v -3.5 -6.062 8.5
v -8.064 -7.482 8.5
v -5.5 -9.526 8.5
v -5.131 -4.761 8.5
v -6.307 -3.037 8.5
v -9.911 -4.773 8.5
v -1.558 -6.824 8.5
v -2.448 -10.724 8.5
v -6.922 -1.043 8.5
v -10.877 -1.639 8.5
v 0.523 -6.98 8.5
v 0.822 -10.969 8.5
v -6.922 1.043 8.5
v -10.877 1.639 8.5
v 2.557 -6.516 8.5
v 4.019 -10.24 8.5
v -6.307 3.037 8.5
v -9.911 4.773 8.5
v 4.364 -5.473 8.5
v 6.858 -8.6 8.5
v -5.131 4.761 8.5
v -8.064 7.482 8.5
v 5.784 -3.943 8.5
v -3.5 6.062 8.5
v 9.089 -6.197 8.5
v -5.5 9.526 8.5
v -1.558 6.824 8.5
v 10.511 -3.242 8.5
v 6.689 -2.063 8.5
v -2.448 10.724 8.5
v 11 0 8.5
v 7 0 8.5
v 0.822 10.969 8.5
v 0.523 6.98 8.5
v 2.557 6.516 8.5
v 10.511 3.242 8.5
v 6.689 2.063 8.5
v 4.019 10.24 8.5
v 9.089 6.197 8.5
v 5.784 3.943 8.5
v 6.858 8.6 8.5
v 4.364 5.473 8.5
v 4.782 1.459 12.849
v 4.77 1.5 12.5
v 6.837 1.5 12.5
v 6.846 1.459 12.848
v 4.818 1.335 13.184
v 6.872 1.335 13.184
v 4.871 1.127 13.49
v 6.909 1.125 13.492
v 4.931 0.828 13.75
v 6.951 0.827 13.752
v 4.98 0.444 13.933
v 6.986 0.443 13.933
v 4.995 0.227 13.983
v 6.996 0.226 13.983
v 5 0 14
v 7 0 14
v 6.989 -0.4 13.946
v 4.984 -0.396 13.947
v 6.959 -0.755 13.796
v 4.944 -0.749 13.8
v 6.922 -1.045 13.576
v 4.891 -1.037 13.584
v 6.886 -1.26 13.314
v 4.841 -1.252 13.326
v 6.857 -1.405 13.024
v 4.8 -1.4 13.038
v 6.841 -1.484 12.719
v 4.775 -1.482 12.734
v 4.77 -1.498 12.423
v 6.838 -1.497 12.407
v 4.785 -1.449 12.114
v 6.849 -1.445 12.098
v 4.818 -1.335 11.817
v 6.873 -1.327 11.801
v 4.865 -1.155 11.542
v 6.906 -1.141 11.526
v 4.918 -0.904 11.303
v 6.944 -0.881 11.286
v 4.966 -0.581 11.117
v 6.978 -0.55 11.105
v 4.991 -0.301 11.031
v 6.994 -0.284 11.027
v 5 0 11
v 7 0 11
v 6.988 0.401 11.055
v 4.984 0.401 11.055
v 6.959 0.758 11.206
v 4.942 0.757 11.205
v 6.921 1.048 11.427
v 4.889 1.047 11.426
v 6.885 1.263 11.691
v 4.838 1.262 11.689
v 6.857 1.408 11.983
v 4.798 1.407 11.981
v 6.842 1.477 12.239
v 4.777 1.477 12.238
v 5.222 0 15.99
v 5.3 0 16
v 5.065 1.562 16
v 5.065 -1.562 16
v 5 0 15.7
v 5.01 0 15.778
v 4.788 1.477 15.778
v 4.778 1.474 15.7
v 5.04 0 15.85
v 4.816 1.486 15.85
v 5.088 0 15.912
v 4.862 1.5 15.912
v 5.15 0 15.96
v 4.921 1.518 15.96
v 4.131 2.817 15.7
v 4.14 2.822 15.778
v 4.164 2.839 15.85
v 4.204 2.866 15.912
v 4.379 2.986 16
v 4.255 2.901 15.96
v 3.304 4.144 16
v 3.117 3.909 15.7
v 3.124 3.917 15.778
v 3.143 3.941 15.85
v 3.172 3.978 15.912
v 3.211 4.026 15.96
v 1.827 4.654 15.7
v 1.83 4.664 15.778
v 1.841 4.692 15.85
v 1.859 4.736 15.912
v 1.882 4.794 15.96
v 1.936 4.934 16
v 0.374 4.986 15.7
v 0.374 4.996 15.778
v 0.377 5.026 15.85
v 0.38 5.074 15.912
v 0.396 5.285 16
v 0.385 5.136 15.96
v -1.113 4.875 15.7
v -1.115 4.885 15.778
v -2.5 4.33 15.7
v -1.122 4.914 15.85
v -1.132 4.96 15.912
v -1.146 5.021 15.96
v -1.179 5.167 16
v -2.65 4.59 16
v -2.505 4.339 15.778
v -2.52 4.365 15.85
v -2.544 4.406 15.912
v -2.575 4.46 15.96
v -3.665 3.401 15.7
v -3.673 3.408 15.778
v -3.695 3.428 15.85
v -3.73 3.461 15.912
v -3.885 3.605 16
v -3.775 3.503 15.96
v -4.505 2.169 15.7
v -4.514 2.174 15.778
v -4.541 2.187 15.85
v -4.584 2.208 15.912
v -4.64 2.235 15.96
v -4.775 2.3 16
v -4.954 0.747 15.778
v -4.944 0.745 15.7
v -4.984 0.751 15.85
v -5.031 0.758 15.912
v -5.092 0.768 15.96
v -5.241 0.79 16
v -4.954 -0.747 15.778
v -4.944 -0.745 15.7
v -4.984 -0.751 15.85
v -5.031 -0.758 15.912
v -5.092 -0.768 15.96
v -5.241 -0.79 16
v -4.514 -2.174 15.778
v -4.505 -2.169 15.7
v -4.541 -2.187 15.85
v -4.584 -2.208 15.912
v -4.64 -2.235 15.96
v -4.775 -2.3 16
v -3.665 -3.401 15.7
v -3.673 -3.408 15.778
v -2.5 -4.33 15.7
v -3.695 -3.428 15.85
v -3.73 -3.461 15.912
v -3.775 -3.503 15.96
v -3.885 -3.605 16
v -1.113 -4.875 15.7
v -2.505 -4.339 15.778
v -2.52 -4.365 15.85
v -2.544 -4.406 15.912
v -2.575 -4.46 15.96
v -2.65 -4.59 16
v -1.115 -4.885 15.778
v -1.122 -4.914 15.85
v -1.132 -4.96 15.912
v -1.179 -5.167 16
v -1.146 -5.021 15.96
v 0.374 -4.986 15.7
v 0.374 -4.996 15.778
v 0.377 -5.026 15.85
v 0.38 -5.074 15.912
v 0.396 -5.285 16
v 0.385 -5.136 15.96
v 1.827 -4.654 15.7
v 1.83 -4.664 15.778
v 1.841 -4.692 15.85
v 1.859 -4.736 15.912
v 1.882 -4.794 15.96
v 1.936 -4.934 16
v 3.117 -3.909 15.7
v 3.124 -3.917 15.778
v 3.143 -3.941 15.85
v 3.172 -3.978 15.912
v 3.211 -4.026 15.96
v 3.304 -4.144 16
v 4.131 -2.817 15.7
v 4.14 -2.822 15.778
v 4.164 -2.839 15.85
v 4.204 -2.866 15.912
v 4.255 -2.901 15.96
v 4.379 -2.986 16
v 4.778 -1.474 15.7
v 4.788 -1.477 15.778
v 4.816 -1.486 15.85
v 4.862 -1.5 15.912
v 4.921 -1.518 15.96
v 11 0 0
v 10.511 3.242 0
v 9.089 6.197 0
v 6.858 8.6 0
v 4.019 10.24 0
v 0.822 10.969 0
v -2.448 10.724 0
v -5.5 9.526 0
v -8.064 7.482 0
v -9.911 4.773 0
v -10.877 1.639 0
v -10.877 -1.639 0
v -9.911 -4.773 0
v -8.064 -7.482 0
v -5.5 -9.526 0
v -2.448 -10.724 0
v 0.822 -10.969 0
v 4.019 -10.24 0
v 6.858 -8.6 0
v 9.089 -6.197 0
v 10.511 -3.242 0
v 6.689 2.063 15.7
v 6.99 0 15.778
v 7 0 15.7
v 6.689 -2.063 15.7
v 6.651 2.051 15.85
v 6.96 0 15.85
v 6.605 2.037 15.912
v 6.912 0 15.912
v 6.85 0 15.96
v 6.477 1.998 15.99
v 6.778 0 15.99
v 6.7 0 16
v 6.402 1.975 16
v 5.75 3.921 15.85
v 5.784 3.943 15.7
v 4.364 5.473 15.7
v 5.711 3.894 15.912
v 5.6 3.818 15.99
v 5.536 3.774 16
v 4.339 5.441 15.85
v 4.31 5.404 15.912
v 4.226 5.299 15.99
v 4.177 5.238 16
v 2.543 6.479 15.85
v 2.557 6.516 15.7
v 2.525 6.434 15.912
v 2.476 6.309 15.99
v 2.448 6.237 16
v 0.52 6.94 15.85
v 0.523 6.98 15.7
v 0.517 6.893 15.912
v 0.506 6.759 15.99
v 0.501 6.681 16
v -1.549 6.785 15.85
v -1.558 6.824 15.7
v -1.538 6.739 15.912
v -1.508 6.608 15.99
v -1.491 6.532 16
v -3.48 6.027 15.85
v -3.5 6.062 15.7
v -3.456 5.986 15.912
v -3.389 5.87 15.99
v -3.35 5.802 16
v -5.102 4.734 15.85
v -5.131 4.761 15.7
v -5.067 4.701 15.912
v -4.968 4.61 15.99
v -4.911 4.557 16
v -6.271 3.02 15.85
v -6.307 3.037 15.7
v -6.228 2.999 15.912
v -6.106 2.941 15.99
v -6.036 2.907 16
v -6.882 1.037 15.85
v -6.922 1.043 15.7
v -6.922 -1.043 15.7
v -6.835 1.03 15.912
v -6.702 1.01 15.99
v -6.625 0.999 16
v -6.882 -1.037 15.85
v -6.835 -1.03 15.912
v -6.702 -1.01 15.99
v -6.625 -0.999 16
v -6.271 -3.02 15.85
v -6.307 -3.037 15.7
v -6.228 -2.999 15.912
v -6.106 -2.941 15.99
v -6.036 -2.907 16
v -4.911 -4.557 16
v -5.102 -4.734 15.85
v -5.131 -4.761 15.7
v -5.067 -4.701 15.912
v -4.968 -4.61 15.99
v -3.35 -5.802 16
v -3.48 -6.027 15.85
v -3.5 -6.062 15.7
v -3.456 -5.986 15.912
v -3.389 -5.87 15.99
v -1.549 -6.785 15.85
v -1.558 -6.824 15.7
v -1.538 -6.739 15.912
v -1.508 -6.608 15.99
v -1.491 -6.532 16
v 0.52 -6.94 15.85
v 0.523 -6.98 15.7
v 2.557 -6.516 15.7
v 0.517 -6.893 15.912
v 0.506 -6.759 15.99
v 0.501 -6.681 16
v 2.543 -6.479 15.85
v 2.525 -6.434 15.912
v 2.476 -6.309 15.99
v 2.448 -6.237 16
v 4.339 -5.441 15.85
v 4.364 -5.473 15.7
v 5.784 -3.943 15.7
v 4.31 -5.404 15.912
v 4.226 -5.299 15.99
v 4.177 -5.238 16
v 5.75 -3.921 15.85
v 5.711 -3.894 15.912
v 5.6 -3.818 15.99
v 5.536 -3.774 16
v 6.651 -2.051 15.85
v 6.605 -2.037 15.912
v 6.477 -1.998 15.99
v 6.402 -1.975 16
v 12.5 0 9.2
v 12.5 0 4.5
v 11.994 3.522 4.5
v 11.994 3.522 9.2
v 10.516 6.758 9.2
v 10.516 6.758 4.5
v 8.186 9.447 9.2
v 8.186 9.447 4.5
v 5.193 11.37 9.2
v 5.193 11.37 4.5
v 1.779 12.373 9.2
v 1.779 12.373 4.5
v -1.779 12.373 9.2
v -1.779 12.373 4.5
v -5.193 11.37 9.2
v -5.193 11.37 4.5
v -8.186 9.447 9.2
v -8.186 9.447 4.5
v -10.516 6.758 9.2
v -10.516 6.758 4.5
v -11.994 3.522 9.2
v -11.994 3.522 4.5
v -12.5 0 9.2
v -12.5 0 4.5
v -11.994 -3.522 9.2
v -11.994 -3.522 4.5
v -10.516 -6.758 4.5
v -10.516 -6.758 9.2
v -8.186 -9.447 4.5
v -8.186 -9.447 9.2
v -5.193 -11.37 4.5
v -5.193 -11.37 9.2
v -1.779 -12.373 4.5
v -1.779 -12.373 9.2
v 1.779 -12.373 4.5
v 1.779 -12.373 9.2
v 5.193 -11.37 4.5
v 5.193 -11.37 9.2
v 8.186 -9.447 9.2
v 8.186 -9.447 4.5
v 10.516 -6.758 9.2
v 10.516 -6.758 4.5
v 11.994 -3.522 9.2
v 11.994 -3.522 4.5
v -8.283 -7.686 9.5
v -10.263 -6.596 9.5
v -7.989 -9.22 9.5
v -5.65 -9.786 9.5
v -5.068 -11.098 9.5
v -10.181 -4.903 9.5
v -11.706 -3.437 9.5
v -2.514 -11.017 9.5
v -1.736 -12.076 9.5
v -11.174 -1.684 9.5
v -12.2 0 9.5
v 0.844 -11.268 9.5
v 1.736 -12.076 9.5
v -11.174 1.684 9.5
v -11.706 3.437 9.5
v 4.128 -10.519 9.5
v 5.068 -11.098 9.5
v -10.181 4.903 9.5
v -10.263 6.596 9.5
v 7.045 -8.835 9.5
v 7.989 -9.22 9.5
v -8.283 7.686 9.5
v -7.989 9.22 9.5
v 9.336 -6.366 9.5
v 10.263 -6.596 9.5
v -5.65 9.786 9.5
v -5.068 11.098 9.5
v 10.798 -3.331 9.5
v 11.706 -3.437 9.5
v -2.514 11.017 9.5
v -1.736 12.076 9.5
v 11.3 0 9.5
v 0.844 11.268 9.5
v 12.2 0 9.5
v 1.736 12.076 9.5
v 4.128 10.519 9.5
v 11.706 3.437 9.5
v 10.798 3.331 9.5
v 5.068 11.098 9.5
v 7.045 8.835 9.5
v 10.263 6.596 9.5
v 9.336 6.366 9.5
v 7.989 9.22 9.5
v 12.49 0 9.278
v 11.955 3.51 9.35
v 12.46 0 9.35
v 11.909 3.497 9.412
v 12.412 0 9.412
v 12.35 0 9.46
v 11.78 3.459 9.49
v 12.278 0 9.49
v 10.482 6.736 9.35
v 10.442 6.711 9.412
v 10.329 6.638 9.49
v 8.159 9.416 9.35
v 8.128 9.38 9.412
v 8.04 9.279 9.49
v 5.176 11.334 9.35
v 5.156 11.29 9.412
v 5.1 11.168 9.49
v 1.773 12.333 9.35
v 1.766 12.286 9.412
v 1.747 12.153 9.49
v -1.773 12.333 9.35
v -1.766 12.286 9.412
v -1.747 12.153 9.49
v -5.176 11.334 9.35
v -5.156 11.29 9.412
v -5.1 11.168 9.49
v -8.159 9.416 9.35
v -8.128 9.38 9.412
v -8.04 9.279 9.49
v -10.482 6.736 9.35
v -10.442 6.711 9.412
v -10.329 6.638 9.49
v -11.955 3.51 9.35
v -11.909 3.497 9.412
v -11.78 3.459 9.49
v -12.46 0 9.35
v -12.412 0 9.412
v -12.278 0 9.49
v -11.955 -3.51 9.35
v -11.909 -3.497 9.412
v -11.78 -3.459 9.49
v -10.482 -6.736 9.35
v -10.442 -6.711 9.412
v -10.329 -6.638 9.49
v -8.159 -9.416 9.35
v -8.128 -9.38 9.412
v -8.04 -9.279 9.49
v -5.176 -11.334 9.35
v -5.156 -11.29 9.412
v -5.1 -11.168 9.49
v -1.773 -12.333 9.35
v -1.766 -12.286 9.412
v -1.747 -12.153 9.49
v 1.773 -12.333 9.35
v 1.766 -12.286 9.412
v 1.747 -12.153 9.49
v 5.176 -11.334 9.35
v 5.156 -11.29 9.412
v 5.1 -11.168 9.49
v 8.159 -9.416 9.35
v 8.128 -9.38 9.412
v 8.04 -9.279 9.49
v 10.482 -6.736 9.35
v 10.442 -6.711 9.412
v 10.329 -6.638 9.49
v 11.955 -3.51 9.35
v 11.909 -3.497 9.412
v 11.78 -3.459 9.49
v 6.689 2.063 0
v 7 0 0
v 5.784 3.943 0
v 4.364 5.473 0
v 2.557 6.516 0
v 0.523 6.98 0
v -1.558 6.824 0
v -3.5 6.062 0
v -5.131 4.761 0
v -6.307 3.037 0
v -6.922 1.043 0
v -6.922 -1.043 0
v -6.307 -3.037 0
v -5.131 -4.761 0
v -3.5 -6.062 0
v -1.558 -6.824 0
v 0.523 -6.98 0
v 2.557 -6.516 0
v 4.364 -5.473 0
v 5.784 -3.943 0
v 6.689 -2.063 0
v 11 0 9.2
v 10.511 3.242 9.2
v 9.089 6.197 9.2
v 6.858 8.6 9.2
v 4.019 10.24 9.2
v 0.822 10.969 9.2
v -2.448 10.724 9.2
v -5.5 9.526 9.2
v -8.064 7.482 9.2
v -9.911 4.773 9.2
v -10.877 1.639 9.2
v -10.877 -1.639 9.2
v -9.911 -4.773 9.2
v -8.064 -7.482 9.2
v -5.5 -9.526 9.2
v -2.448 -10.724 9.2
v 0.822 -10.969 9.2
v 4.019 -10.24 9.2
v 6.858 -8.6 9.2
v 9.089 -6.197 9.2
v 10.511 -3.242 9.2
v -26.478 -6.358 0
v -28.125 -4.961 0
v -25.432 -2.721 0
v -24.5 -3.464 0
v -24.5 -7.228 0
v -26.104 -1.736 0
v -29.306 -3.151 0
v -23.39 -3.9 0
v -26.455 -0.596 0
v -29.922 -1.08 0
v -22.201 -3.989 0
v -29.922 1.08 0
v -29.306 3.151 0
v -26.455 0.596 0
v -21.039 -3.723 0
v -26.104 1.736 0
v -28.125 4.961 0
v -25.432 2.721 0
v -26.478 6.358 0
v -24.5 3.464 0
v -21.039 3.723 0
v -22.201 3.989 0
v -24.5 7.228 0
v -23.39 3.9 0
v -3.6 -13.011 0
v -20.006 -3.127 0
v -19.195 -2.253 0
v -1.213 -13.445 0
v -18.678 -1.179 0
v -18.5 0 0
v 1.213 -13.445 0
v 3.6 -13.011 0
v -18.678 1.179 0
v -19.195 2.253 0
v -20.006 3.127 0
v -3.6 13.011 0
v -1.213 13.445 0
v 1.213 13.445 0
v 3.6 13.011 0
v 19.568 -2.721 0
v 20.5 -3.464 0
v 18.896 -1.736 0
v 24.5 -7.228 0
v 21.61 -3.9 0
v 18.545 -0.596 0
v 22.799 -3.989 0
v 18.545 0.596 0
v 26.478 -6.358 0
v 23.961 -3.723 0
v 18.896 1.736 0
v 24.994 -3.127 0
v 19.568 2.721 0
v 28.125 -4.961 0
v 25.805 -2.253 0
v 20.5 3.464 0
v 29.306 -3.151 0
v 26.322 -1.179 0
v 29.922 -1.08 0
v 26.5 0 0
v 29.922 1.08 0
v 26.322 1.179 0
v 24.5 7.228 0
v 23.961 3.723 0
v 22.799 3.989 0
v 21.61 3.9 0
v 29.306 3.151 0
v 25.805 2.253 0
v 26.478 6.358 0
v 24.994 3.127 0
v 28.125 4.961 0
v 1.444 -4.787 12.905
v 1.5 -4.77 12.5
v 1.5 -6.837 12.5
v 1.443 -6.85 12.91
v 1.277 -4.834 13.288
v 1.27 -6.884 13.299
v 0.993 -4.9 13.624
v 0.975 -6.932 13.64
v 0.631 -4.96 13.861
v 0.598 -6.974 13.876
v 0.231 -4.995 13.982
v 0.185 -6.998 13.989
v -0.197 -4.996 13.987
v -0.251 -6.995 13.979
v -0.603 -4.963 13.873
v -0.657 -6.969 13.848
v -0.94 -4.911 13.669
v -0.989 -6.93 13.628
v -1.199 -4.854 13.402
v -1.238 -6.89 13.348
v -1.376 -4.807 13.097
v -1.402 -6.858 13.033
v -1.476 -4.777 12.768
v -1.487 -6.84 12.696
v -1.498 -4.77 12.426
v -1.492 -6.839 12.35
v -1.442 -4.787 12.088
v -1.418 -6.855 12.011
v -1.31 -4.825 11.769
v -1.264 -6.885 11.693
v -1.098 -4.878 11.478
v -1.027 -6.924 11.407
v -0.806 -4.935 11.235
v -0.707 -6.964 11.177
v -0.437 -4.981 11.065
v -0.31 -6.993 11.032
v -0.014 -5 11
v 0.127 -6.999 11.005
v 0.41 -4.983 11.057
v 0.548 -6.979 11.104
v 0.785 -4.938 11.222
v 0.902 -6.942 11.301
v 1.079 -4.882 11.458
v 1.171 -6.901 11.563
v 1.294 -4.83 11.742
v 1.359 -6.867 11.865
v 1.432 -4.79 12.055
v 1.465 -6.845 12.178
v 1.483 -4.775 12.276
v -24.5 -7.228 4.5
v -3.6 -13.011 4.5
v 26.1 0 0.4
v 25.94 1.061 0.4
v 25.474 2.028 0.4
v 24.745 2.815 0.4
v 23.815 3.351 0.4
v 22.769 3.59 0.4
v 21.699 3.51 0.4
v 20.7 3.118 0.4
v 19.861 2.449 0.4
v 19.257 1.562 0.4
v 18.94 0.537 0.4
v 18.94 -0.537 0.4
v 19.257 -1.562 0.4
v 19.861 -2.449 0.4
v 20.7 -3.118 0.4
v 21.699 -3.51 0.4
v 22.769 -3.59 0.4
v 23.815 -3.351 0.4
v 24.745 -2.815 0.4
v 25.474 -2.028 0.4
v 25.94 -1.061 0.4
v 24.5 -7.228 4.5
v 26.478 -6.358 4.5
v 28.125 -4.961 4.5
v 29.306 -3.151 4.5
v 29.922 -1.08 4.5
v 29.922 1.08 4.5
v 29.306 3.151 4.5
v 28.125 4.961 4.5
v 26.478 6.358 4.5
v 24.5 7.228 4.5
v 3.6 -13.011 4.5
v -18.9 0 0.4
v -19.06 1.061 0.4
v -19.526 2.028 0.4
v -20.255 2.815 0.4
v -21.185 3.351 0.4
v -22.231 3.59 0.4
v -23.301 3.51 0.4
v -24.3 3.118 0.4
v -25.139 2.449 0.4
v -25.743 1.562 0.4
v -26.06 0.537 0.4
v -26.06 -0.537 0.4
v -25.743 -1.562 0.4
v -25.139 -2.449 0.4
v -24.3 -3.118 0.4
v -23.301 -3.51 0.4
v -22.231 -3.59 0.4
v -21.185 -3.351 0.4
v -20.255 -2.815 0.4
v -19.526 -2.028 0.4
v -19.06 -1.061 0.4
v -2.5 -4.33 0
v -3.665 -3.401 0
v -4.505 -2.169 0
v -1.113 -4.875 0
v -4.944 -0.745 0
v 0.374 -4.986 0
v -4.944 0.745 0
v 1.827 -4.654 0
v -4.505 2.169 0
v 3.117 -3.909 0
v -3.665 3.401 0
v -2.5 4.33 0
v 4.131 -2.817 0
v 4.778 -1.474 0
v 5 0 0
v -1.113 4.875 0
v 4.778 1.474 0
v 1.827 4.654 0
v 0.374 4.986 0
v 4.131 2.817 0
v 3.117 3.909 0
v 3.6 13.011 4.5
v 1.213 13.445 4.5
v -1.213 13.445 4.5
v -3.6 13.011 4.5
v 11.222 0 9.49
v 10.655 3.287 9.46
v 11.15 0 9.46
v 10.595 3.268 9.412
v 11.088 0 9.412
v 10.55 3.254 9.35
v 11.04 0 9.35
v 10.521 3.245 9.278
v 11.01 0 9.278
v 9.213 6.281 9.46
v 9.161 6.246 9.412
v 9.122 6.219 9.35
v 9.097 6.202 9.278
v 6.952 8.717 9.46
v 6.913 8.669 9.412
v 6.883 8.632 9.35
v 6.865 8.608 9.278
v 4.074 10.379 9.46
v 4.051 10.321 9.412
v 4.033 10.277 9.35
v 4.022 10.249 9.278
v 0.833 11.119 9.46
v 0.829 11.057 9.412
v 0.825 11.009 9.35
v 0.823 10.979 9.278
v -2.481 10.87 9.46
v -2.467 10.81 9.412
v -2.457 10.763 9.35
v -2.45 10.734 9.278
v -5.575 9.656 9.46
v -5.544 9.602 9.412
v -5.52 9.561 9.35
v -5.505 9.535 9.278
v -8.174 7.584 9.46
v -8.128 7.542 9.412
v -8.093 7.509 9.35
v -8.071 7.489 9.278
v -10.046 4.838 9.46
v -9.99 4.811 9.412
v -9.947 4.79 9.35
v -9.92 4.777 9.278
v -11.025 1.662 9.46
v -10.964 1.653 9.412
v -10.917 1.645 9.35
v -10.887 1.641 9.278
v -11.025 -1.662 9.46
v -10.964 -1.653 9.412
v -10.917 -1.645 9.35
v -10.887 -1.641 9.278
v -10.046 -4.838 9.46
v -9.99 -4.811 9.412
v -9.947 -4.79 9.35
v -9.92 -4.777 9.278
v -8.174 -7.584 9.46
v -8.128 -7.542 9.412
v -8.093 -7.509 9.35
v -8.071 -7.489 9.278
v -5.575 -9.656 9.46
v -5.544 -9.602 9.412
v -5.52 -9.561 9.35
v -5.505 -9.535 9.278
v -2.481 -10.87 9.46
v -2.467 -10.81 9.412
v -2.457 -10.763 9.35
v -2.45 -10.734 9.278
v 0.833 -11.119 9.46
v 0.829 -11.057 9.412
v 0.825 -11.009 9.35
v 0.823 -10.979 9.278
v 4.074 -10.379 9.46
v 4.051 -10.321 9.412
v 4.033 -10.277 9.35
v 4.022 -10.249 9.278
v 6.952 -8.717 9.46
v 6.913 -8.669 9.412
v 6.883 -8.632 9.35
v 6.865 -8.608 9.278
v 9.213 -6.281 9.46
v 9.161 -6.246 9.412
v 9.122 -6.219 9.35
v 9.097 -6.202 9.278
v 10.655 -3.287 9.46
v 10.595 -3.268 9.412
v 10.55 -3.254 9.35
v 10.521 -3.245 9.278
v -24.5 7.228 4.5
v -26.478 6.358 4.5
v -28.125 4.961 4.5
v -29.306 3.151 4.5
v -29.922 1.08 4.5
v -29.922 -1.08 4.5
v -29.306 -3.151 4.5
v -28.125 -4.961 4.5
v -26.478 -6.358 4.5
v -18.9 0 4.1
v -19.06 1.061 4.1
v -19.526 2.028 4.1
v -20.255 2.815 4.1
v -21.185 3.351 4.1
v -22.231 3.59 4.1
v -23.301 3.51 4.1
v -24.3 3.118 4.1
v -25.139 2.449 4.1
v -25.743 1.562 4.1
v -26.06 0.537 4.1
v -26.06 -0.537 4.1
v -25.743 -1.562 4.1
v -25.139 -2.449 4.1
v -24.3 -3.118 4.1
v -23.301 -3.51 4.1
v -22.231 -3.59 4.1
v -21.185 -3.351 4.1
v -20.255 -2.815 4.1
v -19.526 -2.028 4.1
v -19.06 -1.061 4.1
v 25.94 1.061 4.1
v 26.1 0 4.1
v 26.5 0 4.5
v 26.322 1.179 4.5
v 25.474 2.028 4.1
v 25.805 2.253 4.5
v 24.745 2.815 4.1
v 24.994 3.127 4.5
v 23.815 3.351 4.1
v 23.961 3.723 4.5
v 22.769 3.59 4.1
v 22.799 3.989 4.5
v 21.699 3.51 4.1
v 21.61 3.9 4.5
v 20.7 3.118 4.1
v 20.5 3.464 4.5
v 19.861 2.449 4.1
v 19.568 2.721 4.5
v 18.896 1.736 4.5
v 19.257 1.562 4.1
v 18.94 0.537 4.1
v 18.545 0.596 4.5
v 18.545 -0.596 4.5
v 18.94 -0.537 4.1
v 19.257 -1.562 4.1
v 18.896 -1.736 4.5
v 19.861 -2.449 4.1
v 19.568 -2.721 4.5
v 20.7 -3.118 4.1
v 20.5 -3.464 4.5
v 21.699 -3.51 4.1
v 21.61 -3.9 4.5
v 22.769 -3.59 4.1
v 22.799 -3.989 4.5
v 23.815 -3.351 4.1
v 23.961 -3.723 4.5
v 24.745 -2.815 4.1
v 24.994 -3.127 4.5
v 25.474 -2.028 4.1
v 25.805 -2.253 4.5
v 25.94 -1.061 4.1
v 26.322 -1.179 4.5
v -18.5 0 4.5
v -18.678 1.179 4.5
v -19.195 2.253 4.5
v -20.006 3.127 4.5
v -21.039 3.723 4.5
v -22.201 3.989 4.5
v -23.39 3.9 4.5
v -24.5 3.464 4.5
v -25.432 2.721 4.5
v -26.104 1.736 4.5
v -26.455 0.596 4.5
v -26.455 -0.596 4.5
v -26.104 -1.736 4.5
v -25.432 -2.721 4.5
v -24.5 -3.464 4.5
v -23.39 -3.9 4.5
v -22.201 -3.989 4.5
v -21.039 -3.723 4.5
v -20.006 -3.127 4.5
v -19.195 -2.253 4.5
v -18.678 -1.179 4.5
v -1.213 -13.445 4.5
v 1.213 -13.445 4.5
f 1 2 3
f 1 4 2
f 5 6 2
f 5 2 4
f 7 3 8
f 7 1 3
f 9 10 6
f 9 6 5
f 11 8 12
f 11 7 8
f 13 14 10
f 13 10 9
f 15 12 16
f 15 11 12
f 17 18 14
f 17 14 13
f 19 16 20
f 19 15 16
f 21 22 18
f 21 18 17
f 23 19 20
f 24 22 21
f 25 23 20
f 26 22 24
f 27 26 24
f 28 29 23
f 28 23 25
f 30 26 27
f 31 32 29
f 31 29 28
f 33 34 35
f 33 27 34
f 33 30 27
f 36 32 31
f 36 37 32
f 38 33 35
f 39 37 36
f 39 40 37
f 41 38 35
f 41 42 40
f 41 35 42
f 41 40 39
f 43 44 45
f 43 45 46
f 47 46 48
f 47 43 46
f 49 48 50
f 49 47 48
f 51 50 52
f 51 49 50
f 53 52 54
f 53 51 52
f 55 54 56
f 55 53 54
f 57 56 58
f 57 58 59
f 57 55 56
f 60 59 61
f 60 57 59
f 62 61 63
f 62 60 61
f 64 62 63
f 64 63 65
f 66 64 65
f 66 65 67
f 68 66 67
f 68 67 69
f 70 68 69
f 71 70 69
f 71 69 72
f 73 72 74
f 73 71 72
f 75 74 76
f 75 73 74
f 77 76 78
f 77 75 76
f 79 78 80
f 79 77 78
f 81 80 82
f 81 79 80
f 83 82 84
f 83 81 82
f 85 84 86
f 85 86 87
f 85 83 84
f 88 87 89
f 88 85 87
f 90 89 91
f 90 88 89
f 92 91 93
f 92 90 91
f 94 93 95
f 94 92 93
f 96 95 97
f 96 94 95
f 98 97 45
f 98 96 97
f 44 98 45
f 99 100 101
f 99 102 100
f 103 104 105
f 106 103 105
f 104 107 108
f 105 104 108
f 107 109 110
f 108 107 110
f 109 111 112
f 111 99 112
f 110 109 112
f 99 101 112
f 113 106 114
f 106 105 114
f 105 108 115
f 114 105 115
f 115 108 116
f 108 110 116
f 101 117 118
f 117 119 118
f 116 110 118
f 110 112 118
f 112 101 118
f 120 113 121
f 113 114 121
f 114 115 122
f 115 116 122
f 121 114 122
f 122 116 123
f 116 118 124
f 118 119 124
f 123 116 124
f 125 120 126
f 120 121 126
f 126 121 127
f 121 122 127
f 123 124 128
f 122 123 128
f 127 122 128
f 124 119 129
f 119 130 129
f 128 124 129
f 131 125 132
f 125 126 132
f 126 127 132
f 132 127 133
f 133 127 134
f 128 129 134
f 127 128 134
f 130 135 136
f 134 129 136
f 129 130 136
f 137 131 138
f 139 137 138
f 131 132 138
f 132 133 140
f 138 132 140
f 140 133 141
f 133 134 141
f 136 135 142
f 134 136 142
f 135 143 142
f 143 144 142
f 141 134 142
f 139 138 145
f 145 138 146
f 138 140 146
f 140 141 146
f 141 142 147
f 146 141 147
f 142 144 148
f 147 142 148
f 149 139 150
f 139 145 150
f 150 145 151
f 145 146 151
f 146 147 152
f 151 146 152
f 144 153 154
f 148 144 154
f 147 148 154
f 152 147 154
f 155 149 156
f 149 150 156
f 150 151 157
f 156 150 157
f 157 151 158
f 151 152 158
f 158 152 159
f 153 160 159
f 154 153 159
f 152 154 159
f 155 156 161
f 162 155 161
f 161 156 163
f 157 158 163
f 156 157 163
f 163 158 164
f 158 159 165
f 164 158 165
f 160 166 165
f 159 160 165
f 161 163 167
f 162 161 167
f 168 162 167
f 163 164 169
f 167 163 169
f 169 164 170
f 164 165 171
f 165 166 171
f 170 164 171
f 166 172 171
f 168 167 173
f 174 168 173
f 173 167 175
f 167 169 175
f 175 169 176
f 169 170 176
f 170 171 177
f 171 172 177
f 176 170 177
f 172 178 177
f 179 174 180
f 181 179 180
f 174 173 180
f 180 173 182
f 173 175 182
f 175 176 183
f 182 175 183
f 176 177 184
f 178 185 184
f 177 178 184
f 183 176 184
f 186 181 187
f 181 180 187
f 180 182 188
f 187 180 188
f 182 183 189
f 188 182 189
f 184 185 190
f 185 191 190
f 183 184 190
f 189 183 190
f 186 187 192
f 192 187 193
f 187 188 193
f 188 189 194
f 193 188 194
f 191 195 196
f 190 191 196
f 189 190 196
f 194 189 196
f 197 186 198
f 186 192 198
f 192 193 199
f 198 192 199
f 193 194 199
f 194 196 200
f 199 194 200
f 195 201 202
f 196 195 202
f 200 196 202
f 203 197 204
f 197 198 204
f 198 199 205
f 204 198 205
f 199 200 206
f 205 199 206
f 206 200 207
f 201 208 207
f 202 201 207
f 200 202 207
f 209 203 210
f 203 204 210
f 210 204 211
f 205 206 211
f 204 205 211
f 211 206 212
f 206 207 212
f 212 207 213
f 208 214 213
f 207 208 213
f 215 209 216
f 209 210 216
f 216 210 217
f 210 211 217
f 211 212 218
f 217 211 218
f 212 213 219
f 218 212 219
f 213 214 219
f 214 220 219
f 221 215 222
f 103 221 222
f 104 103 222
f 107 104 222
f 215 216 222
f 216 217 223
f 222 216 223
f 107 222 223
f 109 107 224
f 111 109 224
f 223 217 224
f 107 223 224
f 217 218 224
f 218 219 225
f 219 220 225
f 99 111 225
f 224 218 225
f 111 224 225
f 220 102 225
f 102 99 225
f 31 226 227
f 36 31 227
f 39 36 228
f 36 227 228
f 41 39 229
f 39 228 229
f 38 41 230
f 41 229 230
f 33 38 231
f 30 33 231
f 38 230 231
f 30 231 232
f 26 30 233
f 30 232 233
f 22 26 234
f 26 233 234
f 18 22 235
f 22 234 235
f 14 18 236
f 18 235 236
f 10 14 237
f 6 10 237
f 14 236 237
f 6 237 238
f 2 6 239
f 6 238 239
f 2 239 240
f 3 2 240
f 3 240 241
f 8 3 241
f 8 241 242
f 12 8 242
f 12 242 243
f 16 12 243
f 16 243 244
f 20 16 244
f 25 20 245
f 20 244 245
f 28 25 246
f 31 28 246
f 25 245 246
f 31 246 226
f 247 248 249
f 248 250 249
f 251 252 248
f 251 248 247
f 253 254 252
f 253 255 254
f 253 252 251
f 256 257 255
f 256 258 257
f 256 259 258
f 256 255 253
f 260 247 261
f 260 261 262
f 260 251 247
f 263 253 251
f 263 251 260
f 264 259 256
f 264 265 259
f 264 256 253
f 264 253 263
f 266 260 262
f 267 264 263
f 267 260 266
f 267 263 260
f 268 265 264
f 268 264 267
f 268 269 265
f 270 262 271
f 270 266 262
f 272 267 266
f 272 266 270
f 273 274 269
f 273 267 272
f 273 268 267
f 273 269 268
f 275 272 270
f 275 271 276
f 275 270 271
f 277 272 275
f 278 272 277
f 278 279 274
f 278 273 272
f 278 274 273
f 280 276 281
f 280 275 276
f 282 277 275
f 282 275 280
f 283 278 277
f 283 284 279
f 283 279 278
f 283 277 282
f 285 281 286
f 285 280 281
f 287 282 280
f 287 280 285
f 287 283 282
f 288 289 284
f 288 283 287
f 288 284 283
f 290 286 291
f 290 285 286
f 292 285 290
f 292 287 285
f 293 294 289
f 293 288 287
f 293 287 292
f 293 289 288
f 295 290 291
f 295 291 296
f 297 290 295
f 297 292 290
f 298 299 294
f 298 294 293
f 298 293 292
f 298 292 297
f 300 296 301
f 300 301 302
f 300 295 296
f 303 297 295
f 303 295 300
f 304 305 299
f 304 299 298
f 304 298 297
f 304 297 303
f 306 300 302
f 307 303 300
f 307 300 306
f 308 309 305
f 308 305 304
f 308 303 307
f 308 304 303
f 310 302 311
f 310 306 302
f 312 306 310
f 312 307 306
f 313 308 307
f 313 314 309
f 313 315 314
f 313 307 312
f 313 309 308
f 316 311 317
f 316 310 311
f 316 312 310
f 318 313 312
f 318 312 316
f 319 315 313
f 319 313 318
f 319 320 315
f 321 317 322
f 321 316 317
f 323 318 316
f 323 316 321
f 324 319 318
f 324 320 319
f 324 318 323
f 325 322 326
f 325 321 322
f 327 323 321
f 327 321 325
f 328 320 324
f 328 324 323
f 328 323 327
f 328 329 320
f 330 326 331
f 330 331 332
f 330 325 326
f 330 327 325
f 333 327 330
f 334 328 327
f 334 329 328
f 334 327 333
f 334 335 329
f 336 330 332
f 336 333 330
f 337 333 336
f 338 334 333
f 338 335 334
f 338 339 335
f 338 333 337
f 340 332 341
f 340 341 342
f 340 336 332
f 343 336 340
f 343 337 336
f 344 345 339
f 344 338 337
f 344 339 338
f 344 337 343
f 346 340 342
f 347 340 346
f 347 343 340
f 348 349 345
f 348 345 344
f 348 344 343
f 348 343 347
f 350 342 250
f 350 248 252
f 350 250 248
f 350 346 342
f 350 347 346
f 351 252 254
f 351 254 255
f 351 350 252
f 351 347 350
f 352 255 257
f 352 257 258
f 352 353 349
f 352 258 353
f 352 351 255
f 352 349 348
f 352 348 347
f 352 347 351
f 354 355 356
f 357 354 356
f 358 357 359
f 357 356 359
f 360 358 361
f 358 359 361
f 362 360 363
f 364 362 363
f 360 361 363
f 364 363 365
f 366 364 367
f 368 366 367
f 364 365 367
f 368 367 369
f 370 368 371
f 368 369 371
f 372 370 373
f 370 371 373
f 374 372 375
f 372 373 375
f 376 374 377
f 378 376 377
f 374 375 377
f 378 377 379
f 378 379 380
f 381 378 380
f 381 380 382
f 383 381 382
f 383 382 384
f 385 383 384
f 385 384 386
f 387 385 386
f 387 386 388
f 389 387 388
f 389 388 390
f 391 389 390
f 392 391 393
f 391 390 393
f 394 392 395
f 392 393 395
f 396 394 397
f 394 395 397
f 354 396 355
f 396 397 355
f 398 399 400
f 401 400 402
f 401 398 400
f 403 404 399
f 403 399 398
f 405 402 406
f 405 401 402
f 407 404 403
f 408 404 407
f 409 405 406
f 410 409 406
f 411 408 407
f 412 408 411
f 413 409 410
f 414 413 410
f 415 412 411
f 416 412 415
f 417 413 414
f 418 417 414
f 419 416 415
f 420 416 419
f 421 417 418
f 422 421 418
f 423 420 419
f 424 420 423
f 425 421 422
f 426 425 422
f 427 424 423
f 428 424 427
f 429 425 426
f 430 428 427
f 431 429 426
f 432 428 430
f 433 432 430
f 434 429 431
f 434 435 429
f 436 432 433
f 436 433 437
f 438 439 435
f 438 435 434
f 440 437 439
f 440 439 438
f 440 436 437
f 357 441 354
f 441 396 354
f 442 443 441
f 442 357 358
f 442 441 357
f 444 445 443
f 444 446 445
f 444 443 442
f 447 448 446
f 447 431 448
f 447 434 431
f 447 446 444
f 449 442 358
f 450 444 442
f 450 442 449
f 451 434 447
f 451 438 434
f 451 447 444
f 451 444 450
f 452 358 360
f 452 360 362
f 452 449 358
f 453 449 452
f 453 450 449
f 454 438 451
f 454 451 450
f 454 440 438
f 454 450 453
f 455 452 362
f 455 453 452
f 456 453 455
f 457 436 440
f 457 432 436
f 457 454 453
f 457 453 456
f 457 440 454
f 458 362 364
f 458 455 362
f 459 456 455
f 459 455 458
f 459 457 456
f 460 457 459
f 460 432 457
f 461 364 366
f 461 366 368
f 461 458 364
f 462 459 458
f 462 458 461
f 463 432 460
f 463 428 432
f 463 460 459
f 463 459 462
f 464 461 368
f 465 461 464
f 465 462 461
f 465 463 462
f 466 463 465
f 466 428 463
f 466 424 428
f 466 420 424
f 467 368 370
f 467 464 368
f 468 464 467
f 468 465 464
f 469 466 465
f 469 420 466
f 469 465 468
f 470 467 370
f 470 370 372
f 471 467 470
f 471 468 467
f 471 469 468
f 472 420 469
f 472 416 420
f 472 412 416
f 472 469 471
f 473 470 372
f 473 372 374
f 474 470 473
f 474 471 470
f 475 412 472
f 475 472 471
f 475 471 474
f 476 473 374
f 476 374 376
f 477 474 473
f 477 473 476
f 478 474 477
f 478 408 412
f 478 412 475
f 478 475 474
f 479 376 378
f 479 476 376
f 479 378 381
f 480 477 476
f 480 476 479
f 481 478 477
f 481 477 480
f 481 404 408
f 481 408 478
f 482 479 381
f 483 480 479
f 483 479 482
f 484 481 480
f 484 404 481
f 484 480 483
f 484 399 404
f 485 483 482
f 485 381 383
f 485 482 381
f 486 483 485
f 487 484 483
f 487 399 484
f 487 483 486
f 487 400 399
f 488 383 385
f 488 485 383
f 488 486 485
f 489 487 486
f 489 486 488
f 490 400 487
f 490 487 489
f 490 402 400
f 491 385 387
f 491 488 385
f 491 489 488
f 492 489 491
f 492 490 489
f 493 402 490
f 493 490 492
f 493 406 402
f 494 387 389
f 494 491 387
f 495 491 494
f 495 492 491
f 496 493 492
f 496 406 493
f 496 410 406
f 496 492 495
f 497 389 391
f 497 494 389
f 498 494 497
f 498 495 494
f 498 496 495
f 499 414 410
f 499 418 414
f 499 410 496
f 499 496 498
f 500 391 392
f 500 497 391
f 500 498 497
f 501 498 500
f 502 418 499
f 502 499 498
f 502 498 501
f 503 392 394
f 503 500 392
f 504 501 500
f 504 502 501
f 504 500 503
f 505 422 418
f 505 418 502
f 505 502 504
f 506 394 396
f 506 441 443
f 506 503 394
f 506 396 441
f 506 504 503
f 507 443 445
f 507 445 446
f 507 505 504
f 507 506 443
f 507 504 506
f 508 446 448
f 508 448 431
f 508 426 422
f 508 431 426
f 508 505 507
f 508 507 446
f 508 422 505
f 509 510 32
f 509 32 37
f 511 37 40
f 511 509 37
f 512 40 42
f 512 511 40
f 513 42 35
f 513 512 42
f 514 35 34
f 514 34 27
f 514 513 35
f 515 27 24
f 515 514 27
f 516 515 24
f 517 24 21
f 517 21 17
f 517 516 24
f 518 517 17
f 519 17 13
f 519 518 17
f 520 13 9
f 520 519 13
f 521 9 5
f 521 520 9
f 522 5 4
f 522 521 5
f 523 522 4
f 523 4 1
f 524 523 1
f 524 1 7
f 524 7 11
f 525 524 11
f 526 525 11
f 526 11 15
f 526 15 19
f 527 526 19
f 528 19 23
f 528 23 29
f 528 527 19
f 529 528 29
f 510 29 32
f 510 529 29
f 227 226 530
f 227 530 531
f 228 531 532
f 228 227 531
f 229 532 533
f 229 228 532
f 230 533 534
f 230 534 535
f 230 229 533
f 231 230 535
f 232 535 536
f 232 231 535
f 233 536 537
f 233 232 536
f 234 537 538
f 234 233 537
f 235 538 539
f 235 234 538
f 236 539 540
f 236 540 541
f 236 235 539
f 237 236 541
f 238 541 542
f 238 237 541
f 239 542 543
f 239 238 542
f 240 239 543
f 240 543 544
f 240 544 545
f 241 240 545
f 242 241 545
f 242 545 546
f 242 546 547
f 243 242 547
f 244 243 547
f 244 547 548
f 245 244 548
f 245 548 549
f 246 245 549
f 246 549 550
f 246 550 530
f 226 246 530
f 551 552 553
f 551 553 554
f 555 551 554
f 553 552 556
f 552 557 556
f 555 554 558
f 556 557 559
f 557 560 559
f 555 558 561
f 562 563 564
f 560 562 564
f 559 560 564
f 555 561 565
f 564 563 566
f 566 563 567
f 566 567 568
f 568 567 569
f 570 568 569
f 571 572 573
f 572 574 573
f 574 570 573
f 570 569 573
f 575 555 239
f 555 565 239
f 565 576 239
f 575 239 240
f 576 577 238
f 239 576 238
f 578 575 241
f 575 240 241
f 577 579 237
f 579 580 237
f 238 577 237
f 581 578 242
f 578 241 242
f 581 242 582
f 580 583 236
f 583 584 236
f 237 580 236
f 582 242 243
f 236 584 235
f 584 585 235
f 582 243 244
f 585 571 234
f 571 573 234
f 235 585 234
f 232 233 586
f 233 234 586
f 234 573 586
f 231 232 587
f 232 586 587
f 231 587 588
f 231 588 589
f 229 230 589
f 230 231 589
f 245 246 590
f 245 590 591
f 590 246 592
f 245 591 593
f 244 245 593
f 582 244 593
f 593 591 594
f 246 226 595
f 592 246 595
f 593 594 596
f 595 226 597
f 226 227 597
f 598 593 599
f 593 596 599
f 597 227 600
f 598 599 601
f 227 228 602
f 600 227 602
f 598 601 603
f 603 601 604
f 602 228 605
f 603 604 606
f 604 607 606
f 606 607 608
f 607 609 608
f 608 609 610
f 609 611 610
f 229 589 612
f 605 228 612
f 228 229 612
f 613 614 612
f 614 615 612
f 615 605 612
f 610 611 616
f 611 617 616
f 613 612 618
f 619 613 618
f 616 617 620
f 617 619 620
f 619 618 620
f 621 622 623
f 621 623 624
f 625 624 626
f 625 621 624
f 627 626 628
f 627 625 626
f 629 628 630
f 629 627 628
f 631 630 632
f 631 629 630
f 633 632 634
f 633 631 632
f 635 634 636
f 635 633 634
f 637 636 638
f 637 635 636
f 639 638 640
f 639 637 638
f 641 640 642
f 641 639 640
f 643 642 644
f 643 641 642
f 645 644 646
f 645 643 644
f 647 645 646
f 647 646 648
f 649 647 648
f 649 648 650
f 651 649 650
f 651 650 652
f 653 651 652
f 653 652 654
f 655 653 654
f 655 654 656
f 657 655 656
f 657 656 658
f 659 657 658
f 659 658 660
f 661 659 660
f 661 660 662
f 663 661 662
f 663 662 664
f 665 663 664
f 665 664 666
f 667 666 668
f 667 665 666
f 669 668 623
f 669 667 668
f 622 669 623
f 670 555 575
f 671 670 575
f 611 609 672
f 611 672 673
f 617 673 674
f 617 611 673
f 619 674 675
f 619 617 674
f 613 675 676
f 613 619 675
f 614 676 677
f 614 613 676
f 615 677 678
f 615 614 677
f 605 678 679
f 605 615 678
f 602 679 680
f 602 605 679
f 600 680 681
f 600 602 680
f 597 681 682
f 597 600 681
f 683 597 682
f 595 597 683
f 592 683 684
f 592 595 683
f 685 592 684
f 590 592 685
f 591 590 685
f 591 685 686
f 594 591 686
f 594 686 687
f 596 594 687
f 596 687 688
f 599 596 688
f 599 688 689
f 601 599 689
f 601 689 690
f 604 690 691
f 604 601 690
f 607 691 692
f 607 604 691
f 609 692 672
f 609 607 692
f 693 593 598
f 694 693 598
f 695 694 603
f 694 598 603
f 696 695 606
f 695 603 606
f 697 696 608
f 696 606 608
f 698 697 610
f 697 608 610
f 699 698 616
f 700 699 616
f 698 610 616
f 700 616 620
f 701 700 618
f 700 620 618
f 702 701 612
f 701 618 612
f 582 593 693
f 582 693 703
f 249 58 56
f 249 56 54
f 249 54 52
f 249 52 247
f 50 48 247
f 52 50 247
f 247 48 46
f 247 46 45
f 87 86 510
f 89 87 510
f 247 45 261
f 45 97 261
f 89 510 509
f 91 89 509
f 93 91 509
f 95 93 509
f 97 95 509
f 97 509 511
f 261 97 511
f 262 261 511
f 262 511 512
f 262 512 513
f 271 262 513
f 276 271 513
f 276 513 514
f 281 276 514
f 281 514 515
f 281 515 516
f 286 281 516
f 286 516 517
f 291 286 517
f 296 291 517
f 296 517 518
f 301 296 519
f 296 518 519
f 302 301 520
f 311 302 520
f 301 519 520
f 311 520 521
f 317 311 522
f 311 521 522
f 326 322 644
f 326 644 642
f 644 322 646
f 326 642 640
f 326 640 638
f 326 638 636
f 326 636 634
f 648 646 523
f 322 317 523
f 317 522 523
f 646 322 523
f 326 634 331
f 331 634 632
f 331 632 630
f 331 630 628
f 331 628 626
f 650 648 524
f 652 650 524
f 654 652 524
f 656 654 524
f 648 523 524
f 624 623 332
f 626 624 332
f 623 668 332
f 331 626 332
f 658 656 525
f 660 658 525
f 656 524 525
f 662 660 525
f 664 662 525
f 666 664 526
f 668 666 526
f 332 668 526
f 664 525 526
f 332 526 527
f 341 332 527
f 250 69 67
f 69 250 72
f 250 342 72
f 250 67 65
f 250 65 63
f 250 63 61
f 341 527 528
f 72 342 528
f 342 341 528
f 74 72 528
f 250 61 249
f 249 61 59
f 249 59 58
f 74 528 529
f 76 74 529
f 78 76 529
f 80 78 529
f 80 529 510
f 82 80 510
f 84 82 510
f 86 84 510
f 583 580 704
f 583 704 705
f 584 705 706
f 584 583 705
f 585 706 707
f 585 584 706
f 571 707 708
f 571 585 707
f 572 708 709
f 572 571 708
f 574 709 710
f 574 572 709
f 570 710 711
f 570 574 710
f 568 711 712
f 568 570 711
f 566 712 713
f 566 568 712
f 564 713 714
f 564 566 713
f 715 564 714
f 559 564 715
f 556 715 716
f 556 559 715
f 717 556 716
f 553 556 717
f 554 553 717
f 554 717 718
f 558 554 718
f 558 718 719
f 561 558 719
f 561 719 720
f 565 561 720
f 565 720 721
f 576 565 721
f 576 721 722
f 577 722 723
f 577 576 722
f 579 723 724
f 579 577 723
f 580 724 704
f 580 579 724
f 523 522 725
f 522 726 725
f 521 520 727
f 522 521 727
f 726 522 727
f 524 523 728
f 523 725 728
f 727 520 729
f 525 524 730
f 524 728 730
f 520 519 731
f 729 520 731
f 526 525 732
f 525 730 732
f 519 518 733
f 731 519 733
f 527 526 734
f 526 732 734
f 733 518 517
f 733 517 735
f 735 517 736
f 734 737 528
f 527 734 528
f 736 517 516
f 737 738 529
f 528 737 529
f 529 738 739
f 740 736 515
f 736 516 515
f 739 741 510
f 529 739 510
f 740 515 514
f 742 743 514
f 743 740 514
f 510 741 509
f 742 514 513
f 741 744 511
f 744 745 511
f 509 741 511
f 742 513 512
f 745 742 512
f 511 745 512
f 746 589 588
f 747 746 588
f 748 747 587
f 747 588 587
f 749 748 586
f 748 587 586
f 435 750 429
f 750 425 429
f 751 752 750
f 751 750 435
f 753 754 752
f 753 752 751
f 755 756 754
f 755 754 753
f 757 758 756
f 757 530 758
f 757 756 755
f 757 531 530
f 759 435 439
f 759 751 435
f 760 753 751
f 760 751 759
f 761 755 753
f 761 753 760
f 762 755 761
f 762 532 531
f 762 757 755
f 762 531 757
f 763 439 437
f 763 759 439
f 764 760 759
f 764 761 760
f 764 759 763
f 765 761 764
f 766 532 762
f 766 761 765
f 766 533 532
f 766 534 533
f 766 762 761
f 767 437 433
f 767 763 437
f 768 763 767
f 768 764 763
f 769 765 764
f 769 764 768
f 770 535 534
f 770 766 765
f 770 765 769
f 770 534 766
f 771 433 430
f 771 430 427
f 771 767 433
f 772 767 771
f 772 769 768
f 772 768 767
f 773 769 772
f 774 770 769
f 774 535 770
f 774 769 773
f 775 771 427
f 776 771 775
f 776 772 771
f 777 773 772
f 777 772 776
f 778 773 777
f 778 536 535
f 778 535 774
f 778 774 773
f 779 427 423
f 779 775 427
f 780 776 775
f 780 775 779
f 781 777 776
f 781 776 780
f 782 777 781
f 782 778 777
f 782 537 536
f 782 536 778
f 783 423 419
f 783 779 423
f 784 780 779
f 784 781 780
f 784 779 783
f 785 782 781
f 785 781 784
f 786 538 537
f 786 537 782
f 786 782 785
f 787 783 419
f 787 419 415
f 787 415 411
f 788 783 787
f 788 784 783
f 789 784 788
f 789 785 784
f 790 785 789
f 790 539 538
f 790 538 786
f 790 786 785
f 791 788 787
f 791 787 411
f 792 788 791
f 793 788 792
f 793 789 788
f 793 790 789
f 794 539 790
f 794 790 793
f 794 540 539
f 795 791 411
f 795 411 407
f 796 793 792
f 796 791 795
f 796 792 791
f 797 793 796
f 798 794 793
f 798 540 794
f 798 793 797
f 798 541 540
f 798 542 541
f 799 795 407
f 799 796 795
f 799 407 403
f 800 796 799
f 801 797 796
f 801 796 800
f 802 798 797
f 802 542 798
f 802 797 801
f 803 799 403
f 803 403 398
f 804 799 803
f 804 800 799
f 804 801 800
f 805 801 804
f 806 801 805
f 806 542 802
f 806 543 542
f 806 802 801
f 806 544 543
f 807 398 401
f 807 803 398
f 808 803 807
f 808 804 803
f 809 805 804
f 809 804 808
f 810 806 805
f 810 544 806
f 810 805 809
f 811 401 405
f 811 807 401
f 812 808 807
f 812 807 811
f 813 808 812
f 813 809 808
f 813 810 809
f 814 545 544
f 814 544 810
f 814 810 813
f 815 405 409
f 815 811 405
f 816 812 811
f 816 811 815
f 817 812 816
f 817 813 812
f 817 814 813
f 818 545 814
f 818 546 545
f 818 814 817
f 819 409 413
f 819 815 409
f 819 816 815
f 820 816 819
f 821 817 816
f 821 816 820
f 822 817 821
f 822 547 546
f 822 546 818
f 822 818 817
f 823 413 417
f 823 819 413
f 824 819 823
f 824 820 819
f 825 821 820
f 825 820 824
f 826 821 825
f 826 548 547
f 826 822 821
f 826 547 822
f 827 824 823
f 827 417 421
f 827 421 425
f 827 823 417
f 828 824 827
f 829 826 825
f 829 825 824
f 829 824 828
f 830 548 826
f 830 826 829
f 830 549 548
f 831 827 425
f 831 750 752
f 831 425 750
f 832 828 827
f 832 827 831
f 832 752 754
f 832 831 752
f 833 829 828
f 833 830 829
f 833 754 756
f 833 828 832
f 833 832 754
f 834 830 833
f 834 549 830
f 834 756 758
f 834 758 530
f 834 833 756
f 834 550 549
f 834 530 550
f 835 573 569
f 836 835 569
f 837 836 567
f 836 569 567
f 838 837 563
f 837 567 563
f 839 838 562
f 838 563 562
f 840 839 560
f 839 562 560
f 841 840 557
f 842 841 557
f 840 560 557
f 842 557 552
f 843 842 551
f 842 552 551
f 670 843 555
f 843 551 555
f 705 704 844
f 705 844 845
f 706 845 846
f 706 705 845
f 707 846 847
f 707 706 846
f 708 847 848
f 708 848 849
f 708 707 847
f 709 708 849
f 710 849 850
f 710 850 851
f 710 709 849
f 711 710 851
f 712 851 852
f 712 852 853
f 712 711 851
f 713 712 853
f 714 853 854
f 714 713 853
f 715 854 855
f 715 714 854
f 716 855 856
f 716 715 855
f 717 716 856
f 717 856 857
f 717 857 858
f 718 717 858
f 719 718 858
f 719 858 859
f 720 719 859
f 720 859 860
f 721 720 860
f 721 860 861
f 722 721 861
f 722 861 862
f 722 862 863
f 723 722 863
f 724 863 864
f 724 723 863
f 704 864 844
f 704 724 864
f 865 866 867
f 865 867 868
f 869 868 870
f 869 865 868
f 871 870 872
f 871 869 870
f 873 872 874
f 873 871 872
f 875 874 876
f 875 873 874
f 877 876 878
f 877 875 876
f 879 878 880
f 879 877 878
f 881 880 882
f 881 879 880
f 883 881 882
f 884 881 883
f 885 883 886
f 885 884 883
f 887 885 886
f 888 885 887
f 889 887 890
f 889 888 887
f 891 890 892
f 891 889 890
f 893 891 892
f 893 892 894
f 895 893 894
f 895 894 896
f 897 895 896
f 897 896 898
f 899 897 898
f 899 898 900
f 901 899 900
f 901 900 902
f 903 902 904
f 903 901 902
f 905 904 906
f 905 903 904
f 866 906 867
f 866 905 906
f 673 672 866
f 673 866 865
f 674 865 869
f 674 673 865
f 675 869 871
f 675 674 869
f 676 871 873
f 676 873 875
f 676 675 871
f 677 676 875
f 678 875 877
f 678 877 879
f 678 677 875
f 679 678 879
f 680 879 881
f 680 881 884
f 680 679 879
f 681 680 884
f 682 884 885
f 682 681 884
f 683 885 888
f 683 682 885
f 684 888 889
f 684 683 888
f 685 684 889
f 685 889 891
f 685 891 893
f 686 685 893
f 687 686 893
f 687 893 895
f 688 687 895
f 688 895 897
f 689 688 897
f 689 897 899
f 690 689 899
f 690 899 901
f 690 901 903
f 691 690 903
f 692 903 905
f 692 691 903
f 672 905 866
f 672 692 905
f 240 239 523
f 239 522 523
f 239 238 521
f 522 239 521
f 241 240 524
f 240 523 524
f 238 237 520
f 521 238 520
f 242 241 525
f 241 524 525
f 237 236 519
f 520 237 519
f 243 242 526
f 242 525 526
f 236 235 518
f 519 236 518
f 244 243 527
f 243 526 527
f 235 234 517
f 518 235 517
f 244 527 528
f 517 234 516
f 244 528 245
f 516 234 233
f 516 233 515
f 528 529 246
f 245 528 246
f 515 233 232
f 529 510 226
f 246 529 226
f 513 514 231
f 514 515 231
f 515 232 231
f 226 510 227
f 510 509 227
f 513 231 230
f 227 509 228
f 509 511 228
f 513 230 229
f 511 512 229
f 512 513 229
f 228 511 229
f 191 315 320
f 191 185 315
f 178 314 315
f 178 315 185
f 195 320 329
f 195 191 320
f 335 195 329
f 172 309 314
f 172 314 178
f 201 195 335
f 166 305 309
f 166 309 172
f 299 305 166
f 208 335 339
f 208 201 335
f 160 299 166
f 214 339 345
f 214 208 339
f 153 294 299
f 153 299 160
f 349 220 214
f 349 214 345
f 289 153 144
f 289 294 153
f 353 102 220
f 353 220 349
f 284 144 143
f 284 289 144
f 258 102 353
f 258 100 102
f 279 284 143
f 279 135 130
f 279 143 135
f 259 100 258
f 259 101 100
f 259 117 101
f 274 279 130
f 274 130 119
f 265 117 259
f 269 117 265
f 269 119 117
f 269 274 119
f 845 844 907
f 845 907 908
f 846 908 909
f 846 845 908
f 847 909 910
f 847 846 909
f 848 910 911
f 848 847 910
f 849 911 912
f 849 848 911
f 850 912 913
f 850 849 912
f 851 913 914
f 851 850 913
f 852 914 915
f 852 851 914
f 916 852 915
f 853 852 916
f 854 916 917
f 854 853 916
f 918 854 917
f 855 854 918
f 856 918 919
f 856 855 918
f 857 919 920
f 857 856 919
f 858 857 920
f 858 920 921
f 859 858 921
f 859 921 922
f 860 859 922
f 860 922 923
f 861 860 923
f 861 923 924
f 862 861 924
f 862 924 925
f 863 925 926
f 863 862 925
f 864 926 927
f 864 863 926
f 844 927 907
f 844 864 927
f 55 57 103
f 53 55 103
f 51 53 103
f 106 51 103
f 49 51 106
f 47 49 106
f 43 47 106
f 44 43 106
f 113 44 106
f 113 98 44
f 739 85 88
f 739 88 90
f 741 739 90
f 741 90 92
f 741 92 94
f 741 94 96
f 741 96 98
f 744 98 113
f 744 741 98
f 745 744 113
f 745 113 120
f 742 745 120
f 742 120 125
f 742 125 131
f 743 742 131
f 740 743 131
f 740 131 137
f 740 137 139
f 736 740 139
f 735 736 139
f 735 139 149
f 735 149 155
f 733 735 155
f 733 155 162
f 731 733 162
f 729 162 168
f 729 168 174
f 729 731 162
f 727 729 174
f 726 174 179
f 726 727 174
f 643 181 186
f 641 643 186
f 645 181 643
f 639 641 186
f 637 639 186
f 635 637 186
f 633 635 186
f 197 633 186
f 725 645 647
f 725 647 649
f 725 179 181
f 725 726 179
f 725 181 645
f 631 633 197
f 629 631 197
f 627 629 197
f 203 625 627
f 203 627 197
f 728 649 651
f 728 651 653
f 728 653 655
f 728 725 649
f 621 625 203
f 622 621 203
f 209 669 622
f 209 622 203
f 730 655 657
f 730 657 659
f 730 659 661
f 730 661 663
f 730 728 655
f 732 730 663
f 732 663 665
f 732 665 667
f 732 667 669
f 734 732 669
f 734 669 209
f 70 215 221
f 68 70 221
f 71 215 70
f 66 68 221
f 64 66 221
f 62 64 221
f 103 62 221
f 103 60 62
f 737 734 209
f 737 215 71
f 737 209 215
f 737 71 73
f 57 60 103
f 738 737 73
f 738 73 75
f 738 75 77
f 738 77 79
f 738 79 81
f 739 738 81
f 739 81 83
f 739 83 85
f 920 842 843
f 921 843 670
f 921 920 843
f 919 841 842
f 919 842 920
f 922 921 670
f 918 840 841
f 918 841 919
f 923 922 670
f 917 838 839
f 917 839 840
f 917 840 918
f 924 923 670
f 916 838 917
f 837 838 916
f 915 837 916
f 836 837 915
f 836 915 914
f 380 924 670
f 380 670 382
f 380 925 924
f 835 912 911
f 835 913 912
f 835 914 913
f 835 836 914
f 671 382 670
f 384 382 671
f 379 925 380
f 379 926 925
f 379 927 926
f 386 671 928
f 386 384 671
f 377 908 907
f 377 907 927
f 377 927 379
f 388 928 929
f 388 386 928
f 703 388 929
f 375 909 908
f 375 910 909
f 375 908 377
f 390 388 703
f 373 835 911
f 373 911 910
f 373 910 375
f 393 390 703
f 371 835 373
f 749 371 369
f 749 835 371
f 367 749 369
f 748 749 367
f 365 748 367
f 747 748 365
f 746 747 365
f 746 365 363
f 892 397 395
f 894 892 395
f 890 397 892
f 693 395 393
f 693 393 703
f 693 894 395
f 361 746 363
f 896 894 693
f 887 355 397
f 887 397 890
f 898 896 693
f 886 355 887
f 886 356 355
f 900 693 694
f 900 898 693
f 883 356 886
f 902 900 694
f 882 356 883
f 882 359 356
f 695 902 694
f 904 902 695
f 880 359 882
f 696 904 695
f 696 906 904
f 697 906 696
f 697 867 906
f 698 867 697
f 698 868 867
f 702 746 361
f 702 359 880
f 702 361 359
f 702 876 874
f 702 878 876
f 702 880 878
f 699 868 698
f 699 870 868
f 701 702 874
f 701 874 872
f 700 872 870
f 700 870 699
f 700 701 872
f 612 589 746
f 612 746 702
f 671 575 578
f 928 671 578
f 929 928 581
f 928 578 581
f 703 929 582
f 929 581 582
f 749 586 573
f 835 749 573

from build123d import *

# Parameters (mm, degrees)
SKETCH_R          = 7
SKETCH_R_2        = 5
PAD_DEPTH         = 16
FILLET001_R       = 0.3
CYLINDER_R        = 1.5
CYLINDER_DEPTH    = 8
CYLINDER001_R     = 1.5
CYLINDER001_DEPTH = 10
SKETCH001_R       = 11
SKETCH001_R_2     = 7
PAD001_DEPTH      = 8.5
SKETCH002_R       = 3.6
SKETCH002_R_2     = 11
PAD002_DEPTH      = 4.5
SKETCH003_R       = 12.5
SKETCH003_R_2     = 11
PAD003_DEPTH      = 5
FILLET_R          = 0.3
CHAMFER_SIZE      = 0.4


with BuildPart() as body:
    # Sketch → Pad (new body)
    with BuildSketch(Plane.XY):
        Circle(SKETCH_R)
        Circle(SKETCH_R_2, mode=Mode.SUBTRACT)
    extrude(amount=PAD_DEPTH)

    # Fillet001
    fillet001_edges = [body.edges().sort_by_distance(p)[0] for p in [
        (-7, 0, 16),
        (-5, 0, 16),
    ]]
    fillet(fillet001_edges, radius=FILLET001_R)

    # Cylinder → Cylinder (cut)
    with BuildSketch(Plane(origin=(0, 0, 12.5), x_dir=(0, 1, 0), z_dir=(1, 0, 0))):
        Circle(CYLINDER_R)
    extrude(amount=CYLINDER_DEPTH, mode=Mode.SUBTRACT)

    # Cylinder001 → Cylinder001 (cut)
    with BuildSketch(Plane(origin=(0, 0, 12.5), x_dir=(1, 0, 0), z_dir=(0, -1, 0))):
        Circle(CYLINDER001_R)
    extrude(amount=CYLINDER001_DEPTH, mode=Mode.SUBTRACT)


with BuildPart() as body001:
    # Sketch001 → Pad001 (new body)
    with BuildSketch(Plane.XY):
        Circle(SKETCH001_R)
        Circle(SKETCH001_R_2, mode=Mode.SUBTRACT)
    extrude(amount=PAD001_DEPTH)


with BuildPart() as body002:
    # Sketch002 → Pad002 (new body)
    with BuildSketch(Plane.XY):
        with BuildLine():
            ThreePointArc((-24.5, 7.228416), (-30, 0), (-24.5, -7.228416))
            Line((-24.5, -7.228416), (-3.6, -13.011149))
            ThreePointArc((-3.6, -13.011149), (0, -13.5), (3.6, -13.011149))
            Line((24.5, -7.228416), (3.6, -13.011149))
            ThreePointArc((24.5, -7.228416), (30, 0), (24.5, 7.228416))
            Line((3.6, 13.011149), (24.5, 7.228416))
            ThreePointArc((3.6, 13.011149), (0, 13.5), (-3.6, 13.011149))
            Line((-3.6, 13.011149), (-24.5, 7.228416))
        make_face()
        with Locations((-22.5, 0)):
            Circle(SKETCH002_R, mode=Mode.SUBTRACT)
        with Locations((22.5, 0)):
            Circle(SKETCH002_R, mode=Mode.SUBTRACT)
        Circle(SKETCH002_R_2, mode=Mode.SUBTRACT)
    extrude(amount=PAD002_DEPTH)

    # Sketch003 (on Face13 of Pad002) → Pad003 (join)
    with BuildSketch(Plane.XY.offset(4.5)):
        Circle(SKETCH003_R)
        Circle(SKETCH003_R_2, mode=Mode.SUBTRACT)
    extrude(amount=PAD003_DEPTH)

    # Fillet
    fillet_edges = [body002.edges().sort_by_distance(p)[0] for p in [
        (-12.5, 0, 9.5),
        (-11, 0, 9.5),
    ]]
    fillet(fillet_edges, radius=FILLET_R)

    # Chamfer
    chamfer_edges = [body002.edges().sort_by_distance(p)[0] for p in [
        (-26.1, 0, 4.5),
        (18.9, 0, 4.5),
        (-26.1, 0, 0),
        (18.9, 0, 0),
    ]]
    chamfer(chamfer_edges, length=CHAMFER_SIZE)


solid = Compound([body.part, body001.part, body002.part])
